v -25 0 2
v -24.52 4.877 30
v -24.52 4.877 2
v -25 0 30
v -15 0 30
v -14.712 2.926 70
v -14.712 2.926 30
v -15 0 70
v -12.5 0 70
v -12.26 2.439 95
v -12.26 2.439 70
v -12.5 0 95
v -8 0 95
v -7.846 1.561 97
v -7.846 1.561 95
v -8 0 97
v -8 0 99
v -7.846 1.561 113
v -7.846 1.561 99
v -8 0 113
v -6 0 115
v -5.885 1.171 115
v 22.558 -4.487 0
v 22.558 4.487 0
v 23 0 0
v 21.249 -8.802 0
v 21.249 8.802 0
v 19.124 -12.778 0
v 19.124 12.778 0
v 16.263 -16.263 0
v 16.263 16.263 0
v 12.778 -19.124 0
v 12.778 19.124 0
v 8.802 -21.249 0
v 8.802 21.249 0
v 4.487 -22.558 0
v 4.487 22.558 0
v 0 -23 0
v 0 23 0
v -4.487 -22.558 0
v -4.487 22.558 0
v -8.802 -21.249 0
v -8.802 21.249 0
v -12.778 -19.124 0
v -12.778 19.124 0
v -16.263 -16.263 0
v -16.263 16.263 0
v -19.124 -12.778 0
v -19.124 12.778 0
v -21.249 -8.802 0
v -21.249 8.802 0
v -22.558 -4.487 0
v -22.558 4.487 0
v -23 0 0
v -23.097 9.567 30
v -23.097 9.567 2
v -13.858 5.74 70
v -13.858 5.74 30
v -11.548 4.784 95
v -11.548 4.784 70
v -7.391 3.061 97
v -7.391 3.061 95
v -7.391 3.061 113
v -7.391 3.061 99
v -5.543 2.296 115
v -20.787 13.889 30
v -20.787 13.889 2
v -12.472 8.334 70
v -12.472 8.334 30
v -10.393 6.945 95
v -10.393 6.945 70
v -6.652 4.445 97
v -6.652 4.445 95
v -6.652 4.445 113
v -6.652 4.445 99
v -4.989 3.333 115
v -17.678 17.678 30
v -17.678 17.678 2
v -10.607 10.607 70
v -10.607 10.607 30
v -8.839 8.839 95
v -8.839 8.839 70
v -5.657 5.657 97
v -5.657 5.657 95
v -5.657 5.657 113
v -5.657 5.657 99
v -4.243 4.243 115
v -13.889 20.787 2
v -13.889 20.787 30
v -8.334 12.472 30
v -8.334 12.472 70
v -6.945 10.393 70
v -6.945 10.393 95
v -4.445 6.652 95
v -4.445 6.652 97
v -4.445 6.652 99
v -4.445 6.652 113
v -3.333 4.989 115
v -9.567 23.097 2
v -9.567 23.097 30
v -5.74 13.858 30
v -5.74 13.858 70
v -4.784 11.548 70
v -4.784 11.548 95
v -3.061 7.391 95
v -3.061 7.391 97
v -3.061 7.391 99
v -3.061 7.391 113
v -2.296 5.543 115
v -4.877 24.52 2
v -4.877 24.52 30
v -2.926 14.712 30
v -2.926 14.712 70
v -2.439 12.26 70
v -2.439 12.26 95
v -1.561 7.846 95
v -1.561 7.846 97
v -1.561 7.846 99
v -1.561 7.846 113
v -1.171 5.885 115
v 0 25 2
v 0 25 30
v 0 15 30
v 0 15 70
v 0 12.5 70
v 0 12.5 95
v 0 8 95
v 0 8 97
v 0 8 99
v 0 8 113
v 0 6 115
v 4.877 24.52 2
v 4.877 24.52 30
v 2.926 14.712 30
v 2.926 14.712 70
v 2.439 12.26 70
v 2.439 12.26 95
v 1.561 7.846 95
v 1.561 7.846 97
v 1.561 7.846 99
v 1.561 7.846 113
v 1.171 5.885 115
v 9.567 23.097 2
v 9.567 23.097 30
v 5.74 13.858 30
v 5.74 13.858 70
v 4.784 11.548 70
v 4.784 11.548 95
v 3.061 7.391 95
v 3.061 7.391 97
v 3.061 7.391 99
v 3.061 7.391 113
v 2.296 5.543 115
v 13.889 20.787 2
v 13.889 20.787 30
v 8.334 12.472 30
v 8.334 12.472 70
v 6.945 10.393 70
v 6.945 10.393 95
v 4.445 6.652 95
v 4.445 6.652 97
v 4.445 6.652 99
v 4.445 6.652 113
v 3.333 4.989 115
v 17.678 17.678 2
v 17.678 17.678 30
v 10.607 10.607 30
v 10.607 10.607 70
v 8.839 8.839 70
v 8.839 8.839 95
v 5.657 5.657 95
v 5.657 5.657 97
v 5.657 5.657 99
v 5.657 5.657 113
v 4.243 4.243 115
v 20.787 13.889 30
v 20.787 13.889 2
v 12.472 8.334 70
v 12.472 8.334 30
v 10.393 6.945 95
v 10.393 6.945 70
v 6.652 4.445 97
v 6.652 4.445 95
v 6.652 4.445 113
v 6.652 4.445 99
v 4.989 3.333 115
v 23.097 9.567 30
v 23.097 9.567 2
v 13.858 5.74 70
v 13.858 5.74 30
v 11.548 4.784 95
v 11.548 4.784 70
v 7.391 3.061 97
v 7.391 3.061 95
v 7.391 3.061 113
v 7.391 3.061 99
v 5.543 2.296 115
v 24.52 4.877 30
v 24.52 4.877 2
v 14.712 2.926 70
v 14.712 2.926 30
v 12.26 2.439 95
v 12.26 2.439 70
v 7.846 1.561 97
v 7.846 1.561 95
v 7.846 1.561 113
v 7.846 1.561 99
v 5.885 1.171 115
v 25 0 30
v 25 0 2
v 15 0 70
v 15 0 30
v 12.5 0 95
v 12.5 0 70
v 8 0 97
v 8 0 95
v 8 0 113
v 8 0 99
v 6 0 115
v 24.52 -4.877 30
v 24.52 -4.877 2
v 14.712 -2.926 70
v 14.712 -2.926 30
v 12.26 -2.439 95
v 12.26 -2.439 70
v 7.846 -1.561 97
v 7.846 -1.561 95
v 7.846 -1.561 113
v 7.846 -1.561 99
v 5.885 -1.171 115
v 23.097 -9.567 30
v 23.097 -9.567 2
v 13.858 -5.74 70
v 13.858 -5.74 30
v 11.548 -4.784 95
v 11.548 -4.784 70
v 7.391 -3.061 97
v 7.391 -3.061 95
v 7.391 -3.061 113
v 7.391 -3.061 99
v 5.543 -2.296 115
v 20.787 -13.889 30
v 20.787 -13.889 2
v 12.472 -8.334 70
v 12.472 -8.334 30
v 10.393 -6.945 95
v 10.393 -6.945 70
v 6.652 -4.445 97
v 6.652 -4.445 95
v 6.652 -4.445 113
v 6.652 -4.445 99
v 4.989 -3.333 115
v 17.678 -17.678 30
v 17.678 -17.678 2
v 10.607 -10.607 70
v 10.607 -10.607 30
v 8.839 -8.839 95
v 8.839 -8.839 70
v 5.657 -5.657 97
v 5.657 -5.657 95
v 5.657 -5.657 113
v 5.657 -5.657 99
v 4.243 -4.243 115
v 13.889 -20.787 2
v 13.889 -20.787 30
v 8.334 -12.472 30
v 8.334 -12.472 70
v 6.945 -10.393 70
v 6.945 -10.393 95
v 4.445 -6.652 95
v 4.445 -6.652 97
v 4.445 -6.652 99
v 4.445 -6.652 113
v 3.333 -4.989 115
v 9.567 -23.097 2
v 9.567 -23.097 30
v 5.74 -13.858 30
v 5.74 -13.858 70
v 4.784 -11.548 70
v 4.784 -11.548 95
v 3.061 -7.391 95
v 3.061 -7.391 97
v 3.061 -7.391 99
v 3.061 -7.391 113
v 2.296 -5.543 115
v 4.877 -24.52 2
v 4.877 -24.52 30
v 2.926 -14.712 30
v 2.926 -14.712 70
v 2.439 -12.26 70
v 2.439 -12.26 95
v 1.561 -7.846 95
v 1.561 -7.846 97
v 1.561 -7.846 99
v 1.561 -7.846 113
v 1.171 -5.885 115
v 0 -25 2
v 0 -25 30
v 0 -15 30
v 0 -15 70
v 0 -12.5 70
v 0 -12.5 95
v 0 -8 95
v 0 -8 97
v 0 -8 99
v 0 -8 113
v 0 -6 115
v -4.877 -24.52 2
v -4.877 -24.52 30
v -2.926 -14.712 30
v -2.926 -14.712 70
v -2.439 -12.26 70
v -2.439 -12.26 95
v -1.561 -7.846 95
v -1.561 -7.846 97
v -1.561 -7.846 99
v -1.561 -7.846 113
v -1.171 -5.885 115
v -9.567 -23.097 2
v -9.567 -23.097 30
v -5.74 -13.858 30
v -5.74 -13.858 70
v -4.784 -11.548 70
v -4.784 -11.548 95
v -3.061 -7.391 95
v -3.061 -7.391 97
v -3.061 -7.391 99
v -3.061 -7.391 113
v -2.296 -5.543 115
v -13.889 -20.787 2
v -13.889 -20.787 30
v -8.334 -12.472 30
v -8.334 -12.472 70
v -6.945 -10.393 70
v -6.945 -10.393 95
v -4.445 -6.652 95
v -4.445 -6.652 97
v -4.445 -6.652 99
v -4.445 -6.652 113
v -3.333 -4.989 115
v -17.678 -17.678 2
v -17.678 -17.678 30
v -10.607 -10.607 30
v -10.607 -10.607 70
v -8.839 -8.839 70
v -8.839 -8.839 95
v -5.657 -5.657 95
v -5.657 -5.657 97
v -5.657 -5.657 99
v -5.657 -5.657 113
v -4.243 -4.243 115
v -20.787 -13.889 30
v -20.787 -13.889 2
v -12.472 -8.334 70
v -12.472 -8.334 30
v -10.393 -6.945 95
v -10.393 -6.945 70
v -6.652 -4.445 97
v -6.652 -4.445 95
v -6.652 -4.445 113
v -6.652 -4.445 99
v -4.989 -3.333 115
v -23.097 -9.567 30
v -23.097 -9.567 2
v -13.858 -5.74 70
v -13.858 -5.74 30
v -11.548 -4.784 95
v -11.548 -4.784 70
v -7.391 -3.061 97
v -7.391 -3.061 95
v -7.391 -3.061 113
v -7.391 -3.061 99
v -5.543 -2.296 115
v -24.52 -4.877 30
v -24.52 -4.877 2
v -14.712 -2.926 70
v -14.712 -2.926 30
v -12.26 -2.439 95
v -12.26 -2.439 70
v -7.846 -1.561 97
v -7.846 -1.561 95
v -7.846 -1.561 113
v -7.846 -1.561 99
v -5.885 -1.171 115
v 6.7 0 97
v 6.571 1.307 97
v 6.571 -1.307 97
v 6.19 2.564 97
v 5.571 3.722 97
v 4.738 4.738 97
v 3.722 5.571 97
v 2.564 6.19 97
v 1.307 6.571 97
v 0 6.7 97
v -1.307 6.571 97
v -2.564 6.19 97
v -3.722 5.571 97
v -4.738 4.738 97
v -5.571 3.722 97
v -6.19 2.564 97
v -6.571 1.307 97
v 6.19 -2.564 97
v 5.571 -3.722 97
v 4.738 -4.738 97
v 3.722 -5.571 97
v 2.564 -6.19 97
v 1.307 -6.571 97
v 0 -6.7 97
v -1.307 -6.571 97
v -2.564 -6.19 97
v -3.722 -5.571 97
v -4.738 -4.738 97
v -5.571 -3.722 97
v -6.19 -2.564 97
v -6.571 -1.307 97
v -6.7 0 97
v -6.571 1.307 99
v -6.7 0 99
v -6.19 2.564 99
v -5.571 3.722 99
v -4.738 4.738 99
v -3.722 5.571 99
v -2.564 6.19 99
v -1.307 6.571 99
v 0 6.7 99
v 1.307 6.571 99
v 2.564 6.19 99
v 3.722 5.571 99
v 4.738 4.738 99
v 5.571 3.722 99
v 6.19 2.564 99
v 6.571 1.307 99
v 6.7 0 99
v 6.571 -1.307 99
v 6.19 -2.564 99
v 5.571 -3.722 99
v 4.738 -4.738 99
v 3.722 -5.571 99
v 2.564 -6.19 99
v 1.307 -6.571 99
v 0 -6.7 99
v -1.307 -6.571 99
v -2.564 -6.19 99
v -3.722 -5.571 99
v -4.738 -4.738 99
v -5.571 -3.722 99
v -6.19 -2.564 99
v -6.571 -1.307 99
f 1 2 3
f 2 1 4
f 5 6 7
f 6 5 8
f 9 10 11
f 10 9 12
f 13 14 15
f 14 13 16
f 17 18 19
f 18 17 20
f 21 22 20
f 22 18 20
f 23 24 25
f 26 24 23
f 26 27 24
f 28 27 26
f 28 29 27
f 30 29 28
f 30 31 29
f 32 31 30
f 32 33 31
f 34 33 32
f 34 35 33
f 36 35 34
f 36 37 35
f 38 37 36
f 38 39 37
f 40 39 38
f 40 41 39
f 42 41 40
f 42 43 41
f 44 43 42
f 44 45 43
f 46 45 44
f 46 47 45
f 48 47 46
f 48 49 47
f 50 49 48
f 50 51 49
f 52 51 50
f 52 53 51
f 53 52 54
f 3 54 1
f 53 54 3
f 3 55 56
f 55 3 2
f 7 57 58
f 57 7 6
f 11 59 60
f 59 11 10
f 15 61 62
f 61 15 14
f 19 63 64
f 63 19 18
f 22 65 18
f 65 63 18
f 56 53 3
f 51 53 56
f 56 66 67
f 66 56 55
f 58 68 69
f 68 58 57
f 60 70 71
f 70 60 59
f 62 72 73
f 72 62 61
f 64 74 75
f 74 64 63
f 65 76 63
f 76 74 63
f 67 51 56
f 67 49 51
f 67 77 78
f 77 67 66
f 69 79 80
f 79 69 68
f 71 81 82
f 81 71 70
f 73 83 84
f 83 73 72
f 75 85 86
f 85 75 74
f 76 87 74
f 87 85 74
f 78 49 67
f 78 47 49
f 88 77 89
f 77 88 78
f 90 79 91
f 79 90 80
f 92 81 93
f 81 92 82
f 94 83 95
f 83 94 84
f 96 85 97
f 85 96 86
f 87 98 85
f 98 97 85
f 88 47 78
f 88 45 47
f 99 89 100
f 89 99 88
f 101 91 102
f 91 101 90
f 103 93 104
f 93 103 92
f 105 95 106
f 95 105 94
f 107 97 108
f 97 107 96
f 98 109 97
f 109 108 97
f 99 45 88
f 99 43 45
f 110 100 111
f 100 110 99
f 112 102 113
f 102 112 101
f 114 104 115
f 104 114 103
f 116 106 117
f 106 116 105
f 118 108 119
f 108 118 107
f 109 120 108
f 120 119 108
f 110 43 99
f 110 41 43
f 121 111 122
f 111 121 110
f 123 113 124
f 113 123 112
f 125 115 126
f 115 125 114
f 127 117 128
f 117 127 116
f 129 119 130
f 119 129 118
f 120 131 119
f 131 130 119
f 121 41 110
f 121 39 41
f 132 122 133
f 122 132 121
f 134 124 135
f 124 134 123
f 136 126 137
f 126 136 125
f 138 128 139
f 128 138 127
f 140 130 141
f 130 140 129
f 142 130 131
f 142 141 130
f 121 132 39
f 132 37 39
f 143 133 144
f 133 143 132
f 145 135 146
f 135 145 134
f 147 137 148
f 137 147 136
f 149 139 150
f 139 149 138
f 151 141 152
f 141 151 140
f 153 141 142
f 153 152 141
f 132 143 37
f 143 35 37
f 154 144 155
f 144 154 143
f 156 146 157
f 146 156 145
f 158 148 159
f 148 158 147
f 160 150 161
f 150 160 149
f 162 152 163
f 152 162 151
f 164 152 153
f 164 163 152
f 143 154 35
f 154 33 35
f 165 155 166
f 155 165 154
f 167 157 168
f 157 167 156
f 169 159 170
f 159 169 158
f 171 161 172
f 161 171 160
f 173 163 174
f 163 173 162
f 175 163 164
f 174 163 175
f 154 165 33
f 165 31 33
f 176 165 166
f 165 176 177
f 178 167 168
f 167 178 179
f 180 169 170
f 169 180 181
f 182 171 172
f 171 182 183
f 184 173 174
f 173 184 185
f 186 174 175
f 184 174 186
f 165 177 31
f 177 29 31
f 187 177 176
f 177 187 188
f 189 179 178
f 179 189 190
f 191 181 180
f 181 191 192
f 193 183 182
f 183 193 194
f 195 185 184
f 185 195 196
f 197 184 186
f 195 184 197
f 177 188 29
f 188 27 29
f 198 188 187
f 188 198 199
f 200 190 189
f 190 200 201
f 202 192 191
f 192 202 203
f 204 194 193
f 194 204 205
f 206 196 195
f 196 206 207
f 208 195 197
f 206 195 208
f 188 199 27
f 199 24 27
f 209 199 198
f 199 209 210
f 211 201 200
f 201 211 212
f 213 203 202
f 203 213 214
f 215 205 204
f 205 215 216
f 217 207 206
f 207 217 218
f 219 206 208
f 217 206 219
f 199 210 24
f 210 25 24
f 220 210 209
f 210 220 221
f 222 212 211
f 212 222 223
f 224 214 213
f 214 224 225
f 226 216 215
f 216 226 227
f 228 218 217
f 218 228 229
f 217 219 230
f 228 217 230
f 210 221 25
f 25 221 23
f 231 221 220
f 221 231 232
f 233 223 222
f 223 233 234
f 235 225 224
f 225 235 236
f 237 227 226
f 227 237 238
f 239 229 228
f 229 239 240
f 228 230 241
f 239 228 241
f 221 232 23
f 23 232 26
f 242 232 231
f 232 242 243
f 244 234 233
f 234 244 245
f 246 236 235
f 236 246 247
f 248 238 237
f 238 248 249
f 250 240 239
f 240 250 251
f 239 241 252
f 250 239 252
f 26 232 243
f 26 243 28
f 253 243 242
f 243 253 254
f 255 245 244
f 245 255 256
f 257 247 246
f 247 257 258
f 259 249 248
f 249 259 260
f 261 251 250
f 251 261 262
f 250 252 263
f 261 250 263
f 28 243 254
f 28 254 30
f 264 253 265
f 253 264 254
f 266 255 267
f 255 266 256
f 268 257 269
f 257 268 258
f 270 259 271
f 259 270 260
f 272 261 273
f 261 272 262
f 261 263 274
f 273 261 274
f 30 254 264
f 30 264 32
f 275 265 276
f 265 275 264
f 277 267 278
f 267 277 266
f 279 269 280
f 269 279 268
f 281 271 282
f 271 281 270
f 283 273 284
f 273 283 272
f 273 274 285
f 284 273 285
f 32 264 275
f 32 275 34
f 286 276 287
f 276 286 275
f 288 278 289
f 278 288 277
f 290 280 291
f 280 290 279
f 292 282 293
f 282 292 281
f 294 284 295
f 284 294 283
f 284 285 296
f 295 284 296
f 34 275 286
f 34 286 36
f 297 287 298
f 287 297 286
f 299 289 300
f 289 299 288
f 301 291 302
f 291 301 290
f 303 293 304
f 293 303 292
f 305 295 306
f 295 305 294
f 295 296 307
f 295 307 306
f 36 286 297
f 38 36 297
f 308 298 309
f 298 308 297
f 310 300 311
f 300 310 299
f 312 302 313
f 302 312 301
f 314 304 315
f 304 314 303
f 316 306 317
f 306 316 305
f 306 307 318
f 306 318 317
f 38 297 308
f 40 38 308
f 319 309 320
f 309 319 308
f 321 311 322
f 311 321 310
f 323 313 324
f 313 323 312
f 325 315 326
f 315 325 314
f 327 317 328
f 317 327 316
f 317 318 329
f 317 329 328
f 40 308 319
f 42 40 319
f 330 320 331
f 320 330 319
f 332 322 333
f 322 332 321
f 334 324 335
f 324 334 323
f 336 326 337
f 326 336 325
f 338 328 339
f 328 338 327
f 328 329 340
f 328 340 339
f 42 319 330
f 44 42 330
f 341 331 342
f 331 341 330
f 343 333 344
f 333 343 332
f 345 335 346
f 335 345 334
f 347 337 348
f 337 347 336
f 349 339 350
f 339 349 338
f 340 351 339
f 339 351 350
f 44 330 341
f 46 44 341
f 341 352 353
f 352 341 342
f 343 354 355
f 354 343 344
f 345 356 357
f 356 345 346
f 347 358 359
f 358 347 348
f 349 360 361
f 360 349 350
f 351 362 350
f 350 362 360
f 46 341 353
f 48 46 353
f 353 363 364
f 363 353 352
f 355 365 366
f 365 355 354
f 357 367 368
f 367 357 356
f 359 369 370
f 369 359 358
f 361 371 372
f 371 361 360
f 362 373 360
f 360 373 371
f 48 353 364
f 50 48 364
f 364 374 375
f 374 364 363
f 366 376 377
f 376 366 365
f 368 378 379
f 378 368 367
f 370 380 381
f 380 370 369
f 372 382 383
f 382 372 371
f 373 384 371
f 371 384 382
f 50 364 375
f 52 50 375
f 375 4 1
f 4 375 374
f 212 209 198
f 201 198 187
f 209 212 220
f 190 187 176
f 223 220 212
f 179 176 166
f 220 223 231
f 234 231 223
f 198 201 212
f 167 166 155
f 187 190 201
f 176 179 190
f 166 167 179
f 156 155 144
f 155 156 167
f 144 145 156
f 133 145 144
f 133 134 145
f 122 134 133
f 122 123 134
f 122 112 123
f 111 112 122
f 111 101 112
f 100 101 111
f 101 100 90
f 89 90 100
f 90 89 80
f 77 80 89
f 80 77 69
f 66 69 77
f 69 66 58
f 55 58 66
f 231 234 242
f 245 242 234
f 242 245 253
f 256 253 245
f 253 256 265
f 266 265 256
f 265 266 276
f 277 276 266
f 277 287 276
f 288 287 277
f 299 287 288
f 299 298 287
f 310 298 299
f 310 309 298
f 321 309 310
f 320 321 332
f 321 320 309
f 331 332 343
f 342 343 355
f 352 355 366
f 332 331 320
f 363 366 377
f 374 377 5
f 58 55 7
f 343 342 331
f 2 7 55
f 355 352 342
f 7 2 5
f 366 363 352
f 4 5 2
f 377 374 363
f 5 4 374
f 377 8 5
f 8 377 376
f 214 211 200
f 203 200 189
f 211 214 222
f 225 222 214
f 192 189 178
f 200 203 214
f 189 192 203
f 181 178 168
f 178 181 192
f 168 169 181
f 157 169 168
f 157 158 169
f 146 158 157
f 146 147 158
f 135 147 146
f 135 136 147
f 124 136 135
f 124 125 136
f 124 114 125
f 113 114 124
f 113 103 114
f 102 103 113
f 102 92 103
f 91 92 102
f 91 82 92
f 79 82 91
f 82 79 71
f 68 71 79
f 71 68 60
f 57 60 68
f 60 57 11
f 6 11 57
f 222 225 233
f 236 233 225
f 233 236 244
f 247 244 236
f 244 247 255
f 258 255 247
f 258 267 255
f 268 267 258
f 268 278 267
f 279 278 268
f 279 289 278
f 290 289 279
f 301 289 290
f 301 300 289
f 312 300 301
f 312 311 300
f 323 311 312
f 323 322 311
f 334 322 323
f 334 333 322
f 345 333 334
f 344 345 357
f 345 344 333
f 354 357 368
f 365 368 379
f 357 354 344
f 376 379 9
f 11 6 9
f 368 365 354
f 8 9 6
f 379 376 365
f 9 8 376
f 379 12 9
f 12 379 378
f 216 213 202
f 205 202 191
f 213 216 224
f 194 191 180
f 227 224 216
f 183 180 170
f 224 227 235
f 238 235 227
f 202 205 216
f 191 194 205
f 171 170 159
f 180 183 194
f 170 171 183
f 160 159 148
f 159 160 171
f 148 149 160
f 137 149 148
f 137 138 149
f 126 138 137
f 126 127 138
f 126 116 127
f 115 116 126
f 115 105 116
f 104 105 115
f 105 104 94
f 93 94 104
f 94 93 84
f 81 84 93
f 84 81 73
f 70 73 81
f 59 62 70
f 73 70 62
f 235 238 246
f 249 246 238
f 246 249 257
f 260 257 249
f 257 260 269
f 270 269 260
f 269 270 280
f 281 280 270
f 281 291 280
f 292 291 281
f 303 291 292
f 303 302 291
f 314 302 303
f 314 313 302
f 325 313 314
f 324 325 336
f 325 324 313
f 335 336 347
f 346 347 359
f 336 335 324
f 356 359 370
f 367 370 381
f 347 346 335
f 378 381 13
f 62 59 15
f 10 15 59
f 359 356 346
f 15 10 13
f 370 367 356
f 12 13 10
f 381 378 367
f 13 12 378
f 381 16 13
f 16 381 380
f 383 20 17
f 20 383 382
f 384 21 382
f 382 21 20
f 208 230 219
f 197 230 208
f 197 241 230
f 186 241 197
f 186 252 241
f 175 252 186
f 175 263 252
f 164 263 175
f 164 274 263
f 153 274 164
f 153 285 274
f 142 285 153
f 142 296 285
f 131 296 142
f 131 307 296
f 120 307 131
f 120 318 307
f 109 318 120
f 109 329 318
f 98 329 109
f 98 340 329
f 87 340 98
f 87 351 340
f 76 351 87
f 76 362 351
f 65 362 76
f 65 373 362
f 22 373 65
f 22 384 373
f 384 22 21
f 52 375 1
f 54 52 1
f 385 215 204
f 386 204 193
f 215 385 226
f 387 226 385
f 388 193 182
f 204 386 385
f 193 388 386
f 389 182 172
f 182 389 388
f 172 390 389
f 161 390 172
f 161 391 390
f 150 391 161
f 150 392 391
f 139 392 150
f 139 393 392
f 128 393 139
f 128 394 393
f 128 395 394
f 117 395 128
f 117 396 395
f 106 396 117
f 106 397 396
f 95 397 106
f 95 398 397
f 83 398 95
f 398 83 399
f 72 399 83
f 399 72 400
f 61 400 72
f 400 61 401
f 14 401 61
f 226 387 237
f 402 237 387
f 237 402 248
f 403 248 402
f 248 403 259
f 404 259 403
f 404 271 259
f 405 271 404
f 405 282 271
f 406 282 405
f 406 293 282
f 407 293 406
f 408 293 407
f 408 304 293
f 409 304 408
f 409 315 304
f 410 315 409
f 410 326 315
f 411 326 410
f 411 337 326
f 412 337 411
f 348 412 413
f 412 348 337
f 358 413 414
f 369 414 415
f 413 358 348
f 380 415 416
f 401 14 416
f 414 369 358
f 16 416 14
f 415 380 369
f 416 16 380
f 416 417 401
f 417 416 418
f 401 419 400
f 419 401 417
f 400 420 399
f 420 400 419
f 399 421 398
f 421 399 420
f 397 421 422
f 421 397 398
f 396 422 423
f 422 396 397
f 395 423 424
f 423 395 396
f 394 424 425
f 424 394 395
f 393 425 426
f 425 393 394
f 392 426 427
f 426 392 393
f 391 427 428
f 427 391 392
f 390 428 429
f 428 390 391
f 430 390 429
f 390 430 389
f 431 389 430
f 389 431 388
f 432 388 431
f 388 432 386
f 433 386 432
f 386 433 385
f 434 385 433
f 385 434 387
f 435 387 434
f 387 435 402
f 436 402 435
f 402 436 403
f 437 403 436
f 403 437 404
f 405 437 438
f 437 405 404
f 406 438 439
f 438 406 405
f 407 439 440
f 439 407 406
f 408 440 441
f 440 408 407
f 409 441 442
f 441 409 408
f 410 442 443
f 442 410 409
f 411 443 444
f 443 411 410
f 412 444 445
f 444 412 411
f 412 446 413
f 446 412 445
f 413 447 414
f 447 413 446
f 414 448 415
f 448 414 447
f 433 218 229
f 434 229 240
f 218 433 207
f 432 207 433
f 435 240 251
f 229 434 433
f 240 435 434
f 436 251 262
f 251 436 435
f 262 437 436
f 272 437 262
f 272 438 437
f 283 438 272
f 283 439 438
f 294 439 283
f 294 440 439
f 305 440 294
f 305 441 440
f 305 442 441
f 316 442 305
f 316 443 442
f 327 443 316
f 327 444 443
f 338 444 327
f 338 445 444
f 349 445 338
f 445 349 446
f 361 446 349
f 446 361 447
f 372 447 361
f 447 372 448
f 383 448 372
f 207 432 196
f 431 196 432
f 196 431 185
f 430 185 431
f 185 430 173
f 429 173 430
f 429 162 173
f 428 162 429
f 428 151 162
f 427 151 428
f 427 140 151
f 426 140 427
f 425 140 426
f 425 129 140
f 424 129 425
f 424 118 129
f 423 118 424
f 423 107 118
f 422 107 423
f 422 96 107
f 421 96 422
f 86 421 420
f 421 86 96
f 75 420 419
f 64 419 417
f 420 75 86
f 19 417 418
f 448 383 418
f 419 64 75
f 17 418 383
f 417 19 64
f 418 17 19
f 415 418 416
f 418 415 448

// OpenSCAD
$fn = 32;

// ----------------------------------------------------------------------
// Stepped shaft: diameters 50, 30, 25, 16 mm, 115 mm long
// ----------------------------------------------------------------------

// --- parameters (mm) ---
d1 = 50;                  // step 1 diameter
len1 = 30;                // step 1 length
d2 = 30;                  // step 2 diameter
len2 = 40;                // step 2 length
d3 = 25;                  // step 3 diameter
len3 = 25;                // step 3 length
d4 = 16;                  // step 4 diameter
len4 = 20;                // step 4 length
total = 115;              // overall length
chamfer = 2;              // end chamfer
groove_r = 8;             // groove radius
groove_z = 97;            // groove position from the end
groove_w = 2;             // groove width
groove_d = 1.3;           // groove depth

/* closed turning profile: x is the radius, y is the length */
profile = [[0, 0], [25 - chamfer, 0], [25, chamfer], [25, 30], [15, 30], [15, 70], [12.5, 70], [12.5, 95], [8, 95], [8, 113], [6, 115], [0, 115]];

difference() {
  rotate_extrude() polygon(profile);
  /* circlip groove just behind the shoulder */
  rotate_extrude() translate([groove_r - groove_d, groove_z]) square([groove_d + 1, groove_w]);
}
